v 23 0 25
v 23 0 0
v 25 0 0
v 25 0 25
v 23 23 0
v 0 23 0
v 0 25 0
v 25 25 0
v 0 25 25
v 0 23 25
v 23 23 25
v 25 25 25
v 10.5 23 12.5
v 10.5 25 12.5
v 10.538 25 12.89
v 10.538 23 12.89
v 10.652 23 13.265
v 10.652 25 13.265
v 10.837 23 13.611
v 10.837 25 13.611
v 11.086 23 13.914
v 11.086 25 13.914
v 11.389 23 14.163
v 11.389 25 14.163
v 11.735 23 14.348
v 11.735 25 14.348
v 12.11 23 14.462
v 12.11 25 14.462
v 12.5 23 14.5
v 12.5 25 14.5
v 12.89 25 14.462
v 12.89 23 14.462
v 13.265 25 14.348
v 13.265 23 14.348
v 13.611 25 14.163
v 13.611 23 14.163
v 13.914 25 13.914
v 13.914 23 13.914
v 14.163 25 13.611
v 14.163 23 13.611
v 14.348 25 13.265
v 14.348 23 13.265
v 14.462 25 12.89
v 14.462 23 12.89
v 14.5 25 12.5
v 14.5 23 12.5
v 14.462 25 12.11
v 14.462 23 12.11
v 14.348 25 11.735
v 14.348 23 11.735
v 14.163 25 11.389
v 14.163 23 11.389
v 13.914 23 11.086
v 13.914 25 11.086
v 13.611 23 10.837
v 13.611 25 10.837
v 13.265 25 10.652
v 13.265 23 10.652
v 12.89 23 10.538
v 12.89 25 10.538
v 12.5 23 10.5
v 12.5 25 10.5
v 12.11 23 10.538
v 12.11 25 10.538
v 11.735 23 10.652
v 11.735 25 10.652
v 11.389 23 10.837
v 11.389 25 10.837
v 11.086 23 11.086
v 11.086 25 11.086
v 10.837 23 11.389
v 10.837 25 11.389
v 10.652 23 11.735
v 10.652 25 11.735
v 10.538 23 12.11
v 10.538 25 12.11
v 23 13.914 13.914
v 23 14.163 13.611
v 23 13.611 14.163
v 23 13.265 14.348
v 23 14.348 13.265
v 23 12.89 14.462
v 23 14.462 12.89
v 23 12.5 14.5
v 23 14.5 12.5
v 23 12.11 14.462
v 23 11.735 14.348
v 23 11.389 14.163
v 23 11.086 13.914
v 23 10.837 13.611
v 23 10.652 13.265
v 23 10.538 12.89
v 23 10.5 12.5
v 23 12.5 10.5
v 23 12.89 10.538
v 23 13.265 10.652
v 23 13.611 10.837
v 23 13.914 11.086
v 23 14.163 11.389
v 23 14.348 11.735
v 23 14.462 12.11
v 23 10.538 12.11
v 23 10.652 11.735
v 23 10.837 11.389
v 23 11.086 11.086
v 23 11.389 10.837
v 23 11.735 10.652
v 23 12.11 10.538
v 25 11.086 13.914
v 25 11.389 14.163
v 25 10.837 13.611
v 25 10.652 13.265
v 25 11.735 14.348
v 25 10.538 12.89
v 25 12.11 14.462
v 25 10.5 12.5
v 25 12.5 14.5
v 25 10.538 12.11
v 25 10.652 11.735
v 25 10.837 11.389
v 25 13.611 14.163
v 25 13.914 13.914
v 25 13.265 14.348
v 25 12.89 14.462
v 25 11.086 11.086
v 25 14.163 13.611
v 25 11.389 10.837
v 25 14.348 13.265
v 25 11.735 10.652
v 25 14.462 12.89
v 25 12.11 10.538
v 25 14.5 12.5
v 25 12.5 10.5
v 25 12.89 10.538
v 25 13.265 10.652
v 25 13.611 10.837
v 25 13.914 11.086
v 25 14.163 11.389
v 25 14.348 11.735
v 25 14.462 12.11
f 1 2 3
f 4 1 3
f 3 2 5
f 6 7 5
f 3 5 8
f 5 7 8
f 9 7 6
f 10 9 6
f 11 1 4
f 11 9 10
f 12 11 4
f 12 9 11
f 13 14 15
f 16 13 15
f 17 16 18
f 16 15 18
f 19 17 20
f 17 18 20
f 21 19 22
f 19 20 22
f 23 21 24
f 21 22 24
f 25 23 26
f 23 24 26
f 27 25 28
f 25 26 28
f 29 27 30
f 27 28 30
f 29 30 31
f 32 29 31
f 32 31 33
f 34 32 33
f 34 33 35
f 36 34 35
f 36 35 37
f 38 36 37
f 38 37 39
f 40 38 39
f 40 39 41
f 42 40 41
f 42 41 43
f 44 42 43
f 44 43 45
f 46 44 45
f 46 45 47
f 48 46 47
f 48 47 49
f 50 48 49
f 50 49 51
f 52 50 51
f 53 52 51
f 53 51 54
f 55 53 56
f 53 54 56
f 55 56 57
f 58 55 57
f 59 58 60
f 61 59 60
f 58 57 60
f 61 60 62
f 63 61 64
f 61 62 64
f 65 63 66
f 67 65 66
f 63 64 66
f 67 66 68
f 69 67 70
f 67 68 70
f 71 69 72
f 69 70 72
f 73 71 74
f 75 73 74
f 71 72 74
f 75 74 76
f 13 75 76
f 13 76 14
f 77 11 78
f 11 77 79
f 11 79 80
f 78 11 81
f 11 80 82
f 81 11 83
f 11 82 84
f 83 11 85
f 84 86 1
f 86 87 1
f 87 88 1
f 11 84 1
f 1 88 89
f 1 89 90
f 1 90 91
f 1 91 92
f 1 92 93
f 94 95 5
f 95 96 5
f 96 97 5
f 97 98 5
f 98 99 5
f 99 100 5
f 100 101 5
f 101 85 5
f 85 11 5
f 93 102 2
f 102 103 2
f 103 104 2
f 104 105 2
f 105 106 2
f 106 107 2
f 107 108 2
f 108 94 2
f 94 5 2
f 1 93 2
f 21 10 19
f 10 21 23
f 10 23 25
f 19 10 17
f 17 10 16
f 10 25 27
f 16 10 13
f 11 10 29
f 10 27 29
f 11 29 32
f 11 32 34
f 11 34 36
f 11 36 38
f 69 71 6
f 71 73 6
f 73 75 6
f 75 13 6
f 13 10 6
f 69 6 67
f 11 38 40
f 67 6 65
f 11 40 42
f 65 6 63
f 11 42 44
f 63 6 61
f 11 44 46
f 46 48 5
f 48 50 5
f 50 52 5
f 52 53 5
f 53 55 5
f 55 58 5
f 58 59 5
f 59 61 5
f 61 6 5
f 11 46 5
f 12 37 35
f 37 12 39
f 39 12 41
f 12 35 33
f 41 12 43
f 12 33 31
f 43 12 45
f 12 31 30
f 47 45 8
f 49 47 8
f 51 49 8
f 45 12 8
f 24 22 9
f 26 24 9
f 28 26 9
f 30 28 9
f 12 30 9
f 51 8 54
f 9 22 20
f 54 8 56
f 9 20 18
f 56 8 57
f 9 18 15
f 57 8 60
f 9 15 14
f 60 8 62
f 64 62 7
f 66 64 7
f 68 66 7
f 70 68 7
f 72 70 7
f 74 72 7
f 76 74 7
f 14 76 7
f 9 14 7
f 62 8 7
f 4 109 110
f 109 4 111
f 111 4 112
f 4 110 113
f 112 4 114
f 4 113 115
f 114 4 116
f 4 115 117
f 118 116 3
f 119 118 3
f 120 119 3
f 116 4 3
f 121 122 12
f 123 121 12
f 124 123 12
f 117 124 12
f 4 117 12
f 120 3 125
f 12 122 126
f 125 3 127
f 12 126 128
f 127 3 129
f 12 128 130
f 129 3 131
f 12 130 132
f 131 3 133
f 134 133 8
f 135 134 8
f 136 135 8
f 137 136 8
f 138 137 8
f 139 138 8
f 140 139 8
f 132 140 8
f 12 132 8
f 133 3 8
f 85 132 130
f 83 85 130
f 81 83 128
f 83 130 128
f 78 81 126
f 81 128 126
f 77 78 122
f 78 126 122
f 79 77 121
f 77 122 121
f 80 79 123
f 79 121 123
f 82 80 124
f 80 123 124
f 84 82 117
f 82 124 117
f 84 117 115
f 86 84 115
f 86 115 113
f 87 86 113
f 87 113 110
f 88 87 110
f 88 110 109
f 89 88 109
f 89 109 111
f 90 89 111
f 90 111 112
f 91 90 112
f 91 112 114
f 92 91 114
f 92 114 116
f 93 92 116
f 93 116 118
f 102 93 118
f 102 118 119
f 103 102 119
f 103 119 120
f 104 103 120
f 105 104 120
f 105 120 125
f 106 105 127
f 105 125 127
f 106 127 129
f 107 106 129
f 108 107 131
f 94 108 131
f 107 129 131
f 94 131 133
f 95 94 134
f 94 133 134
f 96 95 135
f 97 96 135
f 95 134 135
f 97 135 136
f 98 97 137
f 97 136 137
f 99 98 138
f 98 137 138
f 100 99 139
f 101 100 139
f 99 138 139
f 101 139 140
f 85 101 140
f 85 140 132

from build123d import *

# Parameters (mm, degrees)
F1_DEPTH = 25
F2_R     = 2
F3_DEPTH = 25.001
F4_R     = 2
F5_DEPTH = 25.001


with BuildPart() as f1:
    # F0 (on Top) → F1 (new body)
    with BuildSketch(Plane.XY):
        Polygon((23, 23), (23, 0), (25, 0), (25, 25), (0, 25), (0, 23), align=None)
    extrude(amount=F1_DEPTH)

    # F2 (on face) → F3 (cut, through all)
    with BuildSketch(Plane(origin=(0, 25, 0), x_dir=(-1, 0, 0), z_dir=(0, 1, 0))):
        with Locations((-12.5, 12.5)):
            Circle(F2_R)
    extrude(amount=-F3_DEPTH, mode=Mode.SUBTRACT)

    # F4 (on face) → F5 (cut, through all)
    with BuildSketch(Plane.YZ.offset(25)):
        with Locations((12.5, 12.5)):
            Circle(F4_R)
    extrude(amount=-F5_DEPTH, mode=Mode.SUBTRACT)


solid = f1.part
